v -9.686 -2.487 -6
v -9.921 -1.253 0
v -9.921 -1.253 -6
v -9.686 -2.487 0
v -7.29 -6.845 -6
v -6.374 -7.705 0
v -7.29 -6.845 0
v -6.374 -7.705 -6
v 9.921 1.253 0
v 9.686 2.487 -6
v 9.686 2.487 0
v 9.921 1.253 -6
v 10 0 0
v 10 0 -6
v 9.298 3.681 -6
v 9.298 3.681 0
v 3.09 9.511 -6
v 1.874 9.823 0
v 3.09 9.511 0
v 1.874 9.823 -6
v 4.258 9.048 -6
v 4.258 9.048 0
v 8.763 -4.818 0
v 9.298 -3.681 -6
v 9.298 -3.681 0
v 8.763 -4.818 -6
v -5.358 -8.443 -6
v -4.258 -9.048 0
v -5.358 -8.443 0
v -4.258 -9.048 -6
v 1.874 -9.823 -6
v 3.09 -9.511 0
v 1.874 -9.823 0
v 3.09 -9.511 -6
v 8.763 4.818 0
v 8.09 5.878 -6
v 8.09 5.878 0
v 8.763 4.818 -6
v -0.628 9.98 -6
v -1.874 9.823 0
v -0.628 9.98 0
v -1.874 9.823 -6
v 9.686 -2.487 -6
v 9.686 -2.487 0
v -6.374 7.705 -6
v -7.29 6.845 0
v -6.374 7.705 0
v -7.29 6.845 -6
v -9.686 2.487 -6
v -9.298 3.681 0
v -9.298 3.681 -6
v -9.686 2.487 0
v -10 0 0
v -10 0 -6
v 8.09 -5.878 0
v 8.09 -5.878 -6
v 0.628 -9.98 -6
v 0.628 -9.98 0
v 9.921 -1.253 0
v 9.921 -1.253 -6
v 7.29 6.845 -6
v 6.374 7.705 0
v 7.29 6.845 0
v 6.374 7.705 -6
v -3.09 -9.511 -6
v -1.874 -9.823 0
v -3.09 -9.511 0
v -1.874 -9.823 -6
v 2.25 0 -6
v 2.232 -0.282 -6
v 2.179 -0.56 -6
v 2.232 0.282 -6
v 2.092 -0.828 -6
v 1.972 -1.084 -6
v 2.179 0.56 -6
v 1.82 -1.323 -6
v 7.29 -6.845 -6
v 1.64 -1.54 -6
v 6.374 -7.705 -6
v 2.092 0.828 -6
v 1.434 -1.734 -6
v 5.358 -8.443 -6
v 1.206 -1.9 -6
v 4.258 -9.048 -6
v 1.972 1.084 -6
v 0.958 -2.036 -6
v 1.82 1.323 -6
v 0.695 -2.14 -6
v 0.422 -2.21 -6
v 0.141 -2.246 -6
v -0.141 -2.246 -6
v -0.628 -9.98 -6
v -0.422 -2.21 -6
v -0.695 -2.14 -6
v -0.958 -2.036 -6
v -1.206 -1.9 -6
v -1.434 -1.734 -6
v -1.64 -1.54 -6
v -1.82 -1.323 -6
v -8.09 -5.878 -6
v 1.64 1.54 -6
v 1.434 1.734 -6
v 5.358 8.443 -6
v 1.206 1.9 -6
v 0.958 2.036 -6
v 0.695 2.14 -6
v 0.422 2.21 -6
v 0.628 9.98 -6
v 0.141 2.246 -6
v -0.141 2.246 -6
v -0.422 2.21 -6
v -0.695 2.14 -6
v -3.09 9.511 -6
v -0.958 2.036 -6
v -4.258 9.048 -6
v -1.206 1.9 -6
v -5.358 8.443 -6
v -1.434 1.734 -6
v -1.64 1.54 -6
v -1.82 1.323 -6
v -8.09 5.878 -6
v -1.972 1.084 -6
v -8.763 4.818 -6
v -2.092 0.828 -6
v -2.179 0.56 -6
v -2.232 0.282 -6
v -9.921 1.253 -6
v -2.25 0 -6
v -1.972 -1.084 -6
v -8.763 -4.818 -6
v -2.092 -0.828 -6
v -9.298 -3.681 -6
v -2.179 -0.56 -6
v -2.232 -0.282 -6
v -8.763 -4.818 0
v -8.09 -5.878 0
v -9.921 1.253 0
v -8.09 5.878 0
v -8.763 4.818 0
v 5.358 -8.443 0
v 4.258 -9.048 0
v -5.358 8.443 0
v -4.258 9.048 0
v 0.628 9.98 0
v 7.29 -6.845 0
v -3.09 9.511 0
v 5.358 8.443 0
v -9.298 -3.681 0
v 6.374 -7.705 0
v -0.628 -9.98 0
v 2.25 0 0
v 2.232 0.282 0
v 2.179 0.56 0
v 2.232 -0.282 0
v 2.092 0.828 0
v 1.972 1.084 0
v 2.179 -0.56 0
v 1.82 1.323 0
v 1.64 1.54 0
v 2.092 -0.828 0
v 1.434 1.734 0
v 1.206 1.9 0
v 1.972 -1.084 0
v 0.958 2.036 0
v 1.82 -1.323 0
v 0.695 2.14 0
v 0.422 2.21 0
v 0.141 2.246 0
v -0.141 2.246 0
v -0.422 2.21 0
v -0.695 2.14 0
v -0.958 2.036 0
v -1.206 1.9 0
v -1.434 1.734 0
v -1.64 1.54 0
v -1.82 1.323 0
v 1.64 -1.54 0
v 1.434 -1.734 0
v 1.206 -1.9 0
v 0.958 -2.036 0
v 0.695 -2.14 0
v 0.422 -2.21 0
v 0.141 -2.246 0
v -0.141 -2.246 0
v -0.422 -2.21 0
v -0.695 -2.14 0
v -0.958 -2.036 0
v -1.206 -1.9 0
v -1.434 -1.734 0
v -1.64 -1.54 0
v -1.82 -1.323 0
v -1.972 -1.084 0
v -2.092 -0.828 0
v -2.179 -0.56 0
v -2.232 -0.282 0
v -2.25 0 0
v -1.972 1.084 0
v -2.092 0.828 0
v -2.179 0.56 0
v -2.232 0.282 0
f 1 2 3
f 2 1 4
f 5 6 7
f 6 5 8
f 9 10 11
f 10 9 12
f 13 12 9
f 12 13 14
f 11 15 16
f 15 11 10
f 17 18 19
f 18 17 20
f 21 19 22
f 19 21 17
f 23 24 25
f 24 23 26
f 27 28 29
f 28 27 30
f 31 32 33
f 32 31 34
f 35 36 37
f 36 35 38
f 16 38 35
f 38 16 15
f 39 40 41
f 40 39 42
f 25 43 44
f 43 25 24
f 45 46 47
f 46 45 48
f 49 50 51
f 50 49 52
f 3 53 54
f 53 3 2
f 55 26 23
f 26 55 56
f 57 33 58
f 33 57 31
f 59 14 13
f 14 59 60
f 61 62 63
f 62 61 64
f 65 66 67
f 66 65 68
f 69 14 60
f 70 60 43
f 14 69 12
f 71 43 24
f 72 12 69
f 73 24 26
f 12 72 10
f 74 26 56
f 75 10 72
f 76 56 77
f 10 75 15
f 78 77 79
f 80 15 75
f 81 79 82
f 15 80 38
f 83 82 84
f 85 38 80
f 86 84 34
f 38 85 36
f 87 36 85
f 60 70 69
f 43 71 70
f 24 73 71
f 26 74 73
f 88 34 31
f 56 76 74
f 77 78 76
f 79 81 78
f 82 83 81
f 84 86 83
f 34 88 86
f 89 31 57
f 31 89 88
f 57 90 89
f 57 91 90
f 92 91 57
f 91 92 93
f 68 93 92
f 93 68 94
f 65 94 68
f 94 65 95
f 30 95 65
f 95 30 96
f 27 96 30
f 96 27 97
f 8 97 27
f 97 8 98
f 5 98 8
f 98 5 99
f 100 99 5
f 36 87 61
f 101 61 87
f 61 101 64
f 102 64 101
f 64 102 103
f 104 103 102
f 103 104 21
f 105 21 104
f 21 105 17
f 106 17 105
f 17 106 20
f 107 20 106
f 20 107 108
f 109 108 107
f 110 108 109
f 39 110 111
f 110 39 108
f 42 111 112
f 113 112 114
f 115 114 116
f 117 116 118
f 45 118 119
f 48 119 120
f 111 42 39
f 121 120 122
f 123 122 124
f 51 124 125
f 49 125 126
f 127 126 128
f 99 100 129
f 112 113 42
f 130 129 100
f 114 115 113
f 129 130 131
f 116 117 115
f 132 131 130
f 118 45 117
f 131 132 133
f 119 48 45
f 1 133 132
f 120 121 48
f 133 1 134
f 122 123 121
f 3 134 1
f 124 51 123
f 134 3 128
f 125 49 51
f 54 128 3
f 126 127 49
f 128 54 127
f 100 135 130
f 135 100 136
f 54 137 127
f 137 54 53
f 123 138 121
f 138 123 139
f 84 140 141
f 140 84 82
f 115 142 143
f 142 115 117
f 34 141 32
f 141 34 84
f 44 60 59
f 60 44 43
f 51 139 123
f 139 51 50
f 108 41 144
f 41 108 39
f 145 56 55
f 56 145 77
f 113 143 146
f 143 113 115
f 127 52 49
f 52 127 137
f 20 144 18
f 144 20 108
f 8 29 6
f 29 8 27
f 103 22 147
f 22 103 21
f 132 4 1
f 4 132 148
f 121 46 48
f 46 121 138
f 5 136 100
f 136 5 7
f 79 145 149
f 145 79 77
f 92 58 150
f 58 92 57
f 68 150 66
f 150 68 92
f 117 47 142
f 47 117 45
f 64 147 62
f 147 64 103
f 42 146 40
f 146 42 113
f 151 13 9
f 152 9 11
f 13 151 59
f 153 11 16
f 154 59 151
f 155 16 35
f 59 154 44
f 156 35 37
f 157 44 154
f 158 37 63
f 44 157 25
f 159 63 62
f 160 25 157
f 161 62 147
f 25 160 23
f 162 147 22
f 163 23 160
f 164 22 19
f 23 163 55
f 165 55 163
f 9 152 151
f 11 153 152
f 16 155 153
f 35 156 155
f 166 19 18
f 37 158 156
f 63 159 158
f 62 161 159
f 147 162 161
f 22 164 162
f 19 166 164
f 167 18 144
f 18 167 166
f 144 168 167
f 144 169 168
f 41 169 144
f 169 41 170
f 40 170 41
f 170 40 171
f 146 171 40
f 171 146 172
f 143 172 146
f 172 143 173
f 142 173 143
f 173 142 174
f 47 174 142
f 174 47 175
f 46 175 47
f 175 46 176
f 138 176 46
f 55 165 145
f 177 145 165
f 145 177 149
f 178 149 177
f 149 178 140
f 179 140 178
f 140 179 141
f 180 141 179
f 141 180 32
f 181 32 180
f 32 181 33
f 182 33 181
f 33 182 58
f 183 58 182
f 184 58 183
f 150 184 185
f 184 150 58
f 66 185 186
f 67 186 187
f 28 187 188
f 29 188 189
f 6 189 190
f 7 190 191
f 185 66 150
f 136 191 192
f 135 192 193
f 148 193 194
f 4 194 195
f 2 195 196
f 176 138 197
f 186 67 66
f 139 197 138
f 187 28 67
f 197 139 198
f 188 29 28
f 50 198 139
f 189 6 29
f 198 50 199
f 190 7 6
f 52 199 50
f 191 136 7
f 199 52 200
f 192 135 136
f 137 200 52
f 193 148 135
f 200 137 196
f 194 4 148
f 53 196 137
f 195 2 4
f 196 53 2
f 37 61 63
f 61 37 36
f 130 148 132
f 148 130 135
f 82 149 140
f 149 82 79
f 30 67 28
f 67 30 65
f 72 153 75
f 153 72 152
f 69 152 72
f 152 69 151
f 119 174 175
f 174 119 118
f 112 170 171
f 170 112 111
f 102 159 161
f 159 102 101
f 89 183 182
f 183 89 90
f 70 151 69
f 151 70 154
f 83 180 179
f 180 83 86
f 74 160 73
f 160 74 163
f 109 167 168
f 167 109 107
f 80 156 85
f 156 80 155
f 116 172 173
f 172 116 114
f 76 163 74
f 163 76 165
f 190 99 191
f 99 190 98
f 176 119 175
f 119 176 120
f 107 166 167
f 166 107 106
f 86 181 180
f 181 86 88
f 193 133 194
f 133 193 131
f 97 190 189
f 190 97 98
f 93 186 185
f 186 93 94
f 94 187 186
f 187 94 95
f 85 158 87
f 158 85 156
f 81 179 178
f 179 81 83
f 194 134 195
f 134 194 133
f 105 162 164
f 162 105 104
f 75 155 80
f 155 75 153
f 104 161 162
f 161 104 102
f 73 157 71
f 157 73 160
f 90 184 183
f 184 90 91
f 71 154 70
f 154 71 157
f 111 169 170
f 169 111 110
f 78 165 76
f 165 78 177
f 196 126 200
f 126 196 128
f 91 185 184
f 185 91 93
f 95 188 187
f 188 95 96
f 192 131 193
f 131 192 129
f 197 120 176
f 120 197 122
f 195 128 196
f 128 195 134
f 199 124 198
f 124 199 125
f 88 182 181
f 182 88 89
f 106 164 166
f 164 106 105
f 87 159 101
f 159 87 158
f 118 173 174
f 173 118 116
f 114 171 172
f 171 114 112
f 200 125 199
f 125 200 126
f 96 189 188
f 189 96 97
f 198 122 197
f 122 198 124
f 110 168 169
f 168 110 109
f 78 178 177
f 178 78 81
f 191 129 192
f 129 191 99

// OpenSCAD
$fn = 50;


difference() {
	union() {
		translate(v = [0, 0, -6.0000000000]) {
			cylinder(h = 6, r = 10.0000000000);
		}
		cylinder(h = 0, r = 19.0000000000);
	}
	union() {
		#translate(v = [0, 0, -6]) {
			cylinder(h = 6, r = 2.2500000000);
		}
	}
}
